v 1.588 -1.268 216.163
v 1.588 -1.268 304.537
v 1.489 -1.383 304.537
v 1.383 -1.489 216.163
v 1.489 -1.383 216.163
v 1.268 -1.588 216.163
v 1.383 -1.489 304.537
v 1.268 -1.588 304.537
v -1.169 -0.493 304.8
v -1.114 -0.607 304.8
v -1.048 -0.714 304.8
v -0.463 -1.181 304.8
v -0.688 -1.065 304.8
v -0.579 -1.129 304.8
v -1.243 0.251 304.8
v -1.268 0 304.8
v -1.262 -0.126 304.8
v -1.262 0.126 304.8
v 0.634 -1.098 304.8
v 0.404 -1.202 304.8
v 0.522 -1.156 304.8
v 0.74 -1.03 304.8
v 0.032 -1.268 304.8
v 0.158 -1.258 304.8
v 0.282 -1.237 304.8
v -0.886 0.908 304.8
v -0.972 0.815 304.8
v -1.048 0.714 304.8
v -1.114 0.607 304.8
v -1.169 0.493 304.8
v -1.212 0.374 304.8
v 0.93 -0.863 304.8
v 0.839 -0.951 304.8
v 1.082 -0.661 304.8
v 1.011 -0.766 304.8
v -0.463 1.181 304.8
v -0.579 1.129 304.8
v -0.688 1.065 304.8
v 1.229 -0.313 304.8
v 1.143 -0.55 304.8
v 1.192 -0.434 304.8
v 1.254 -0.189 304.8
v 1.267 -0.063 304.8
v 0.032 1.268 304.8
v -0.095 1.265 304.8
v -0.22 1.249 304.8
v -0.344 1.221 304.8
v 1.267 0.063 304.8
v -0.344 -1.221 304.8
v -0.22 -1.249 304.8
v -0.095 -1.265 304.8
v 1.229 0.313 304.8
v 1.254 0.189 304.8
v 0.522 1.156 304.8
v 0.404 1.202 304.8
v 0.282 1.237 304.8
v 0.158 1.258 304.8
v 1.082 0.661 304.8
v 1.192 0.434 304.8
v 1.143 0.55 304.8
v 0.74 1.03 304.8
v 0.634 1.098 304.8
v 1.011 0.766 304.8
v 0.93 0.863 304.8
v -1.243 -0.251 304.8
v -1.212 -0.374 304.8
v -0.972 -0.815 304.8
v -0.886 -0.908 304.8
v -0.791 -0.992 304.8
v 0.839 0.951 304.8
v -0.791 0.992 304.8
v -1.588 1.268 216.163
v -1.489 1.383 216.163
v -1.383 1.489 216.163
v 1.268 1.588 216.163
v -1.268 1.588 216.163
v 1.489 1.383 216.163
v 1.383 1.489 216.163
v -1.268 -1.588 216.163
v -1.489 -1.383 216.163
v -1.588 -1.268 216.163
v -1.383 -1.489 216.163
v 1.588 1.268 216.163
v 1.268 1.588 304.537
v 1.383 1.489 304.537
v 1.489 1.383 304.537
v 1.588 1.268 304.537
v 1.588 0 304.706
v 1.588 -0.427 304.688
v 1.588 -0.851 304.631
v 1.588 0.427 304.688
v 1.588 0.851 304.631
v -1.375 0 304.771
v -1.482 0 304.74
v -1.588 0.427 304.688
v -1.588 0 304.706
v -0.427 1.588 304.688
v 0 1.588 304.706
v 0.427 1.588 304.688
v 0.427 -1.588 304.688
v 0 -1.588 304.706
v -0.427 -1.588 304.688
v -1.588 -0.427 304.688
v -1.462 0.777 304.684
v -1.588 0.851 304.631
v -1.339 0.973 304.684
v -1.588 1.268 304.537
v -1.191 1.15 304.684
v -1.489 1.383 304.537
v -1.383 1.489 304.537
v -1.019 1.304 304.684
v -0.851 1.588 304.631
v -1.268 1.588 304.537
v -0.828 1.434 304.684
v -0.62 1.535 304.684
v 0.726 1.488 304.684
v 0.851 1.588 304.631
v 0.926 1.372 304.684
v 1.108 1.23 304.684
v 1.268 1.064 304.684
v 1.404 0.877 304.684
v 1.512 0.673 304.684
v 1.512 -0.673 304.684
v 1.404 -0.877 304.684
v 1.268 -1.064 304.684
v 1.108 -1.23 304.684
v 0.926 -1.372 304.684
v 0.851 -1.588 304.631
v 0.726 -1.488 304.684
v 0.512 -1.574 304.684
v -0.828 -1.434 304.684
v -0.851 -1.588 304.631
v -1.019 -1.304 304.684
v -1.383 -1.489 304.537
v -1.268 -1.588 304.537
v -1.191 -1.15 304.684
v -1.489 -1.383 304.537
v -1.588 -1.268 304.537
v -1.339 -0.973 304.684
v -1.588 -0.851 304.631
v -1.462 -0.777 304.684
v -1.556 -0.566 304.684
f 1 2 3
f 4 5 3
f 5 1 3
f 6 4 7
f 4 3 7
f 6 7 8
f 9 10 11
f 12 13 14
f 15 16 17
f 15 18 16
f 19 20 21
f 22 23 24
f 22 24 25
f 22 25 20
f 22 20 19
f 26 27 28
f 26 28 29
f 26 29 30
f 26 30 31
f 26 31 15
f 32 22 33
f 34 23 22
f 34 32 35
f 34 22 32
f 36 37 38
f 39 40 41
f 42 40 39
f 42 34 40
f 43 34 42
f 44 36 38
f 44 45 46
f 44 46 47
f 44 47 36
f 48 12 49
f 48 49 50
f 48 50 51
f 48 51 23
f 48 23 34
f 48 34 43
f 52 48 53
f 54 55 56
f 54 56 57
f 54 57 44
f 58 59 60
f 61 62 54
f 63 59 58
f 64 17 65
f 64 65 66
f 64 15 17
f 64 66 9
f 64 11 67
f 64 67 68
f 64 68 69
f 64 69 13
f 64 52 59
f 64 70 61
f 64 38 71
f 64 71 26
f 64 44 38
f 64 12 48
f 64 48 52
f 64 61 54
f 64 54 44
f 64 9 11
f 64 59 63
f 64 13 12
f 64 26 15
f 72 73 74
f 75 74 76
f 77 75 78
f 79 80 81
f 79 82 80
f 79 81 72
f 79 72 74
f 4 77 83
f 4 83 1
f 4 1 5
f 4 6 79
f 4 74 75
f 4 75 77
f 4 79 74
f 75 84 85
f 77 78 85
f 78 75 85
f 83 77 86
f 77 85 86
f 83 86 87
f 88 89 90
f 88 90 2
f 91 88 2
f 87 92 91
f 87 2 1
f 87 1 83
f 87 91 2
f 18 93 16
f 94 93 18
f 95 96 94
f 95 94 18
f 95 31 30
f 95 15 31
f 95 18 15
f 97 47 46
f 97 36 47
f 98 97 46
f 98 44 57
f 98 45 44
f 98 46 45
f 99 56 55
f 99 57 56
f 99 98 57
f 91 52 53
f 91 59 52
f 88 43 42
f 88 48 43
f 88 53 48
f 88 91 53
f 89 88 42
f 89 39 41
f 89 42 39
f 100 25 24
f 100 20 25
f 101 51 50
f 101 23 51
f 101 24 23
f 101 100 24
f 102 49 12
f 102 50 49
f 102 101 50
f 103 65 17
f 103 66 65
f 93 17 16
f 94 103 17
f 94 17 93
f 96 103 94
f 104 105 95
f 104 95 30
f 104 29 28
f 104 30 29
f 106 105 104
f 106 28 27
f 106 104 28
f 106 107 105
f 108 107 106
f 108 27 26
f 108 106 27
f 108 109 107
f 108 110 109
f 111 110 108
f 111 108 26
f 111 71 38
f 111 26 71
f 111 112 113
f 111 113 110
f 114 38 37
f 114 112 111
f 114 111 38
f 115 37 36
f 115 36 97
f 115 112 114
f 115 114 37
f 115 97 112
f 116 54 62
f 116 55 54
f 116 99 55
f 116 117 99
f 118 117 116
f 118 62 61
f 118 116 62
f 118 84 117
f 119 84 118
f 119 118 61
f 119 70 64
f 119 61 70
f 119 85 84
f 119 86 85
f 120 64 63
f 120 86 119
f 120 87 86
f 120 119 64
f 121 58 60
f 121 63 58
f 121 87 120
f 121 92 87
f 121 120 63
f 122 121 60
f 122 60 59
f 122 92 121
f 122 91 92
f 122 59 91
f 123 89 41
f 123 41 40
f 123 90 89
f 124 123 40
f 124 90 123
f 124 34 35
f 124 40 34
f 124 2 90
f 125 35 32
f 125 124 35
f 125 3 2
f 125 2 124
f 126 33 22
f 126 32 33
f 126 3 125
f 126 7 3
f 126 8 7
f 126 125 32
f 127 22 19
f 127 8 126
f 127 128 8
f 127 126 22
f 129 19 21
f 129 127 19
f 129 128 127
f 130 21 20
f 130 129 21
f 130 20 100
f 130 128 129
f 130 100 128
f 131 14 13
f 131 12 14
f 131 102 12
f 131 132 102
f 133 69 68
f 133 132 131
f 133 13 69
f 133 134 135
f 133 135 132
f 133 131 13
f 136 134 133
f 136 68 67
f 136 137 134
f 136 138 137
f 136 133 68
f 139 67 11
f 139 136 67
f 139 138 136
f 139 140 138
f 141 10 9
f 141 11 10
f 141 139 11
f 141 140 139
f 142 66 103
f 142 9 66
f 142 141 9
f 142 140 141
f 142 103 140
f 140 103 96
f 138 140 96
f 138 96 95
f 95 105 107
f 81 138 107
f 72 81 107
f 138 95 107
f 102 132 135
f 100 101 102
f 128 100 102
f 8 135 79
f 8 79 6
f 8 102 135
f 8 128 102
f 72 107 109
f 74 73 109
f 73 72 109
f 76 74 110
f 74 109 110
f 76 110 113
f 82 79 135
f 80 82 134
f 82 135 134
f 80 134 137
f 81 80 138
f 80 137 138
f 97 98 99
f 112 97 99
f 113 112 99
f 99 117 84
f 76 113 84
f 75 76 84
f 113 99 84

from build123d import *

# Parameters (mm, degrees)
SKETCH1_W           = 3.175
SKETCH1_H           = 3.175
BOSS_EXTRUDE1_DEPTH = 152.4
SKETCH2_OUTSIDE_W   = 35.668
SKETCH2_OUTSIDE_H   = 35.668
SKETCH2_OUTSIDE_R   = 2.032
CUT_EXTRUDE1_DEPTH  = 153.4
CUT_EXTRUDE2_DEPTH  = 4.175
SKETCH6_W           = 3.175
SKETCH6_H           = 12.7
CUT_EXTRUDE3_DEPTH  = 4.175


with BuildPart() as part:
    # Sketch1 → Boss-Extrude1 (new body)
    with BuildSketch(Plane.XY):
        Rectangle(SKETCH1_W, SKETCH1_H)
    extrude(amount=BOSS_EXTRUDE1_DEPTH)

    # Sketch2 outside → Cut-Extrude1 (cut, through all)
    with BuildSketch(Plane(origin=(0, 0, 0), x_dir=(-1, 0, 0), z_dir=(0, 0, -1))):
        Rectangle(SKETCH2_OUTSIDE_W, SKETCH2_OUTSIDE_H)
        Circle(SKETCH2_OUTSIDE_R, mode=Mode.SUBTRACT)
    extrude(amount=-CUT_EXTRUDE1_DEPTH, mode=Mode.SUBTRACT)

    # Sketch3 → Cut-Revolve1 (revolve, cut)
    with BuildSketch(Plane(origin=(0, 0, 0), x_dir=(1, 0, 0), z_dir=(0, 1, 0))):
        with BuildLine():
            Line((-5.053685963, -4.40273269), (-5.053685963, 5.740530545))
            Line((-5.053685963, 5.740530545), (0, 5.740530545))
            Line((0, 5.740530545), (0, 0.160877736))
            ThreePointArc((0, 0.160877736), (-3.404639553, -1.148866368), (-5.053685963, -4.40273269))
        make_face()
    revolve(axis=Axis((0, 0, 152.4), (0, 0, -1)), mode=Mode.SUBTRACT)

    # Mirror1: part across plane


with BuildPart() as part_1:
    add(part.part)
    add(part.part.mirror(Plane(origin=(0, 0, 152.4), x_dir=(1, 0, 0), z_dir=(0, 0, -1))))

    # Sketch4 → Cut-Extrude2 (cut, through all)
    with BuildSketch(Plane(origin=(1.5875, 0, 0), x_dir=(0, 0, -1), z_dir=(1, 0, 0))):
        Polygon((-0.263225358, -1.5875), (-203.463225358, -1.5875), (-203.463225358, 1.5875), (-0.263225358, 1.5875), (0.835678169, 1.5875), (0.835678169, -1.5875), align=None)
    extrude(amount=-CUT_EXTRUDE2_DEPTH, mode=Mode.SUBTRACT)

    # Sketch6 → Cut-Extrude3 (cut, through all)
    with BuildSketch(Plane.XZ.offset(1.5875)):
        with Locations((0, 209.813225358)):
            Rectangle(SKETCH6_W, SKETCH6_H)
    extrude(amount=-CUT_EXTRUDE3_DEPTH, mode=Mode.SUBTRACT)


solid = part_1.part
